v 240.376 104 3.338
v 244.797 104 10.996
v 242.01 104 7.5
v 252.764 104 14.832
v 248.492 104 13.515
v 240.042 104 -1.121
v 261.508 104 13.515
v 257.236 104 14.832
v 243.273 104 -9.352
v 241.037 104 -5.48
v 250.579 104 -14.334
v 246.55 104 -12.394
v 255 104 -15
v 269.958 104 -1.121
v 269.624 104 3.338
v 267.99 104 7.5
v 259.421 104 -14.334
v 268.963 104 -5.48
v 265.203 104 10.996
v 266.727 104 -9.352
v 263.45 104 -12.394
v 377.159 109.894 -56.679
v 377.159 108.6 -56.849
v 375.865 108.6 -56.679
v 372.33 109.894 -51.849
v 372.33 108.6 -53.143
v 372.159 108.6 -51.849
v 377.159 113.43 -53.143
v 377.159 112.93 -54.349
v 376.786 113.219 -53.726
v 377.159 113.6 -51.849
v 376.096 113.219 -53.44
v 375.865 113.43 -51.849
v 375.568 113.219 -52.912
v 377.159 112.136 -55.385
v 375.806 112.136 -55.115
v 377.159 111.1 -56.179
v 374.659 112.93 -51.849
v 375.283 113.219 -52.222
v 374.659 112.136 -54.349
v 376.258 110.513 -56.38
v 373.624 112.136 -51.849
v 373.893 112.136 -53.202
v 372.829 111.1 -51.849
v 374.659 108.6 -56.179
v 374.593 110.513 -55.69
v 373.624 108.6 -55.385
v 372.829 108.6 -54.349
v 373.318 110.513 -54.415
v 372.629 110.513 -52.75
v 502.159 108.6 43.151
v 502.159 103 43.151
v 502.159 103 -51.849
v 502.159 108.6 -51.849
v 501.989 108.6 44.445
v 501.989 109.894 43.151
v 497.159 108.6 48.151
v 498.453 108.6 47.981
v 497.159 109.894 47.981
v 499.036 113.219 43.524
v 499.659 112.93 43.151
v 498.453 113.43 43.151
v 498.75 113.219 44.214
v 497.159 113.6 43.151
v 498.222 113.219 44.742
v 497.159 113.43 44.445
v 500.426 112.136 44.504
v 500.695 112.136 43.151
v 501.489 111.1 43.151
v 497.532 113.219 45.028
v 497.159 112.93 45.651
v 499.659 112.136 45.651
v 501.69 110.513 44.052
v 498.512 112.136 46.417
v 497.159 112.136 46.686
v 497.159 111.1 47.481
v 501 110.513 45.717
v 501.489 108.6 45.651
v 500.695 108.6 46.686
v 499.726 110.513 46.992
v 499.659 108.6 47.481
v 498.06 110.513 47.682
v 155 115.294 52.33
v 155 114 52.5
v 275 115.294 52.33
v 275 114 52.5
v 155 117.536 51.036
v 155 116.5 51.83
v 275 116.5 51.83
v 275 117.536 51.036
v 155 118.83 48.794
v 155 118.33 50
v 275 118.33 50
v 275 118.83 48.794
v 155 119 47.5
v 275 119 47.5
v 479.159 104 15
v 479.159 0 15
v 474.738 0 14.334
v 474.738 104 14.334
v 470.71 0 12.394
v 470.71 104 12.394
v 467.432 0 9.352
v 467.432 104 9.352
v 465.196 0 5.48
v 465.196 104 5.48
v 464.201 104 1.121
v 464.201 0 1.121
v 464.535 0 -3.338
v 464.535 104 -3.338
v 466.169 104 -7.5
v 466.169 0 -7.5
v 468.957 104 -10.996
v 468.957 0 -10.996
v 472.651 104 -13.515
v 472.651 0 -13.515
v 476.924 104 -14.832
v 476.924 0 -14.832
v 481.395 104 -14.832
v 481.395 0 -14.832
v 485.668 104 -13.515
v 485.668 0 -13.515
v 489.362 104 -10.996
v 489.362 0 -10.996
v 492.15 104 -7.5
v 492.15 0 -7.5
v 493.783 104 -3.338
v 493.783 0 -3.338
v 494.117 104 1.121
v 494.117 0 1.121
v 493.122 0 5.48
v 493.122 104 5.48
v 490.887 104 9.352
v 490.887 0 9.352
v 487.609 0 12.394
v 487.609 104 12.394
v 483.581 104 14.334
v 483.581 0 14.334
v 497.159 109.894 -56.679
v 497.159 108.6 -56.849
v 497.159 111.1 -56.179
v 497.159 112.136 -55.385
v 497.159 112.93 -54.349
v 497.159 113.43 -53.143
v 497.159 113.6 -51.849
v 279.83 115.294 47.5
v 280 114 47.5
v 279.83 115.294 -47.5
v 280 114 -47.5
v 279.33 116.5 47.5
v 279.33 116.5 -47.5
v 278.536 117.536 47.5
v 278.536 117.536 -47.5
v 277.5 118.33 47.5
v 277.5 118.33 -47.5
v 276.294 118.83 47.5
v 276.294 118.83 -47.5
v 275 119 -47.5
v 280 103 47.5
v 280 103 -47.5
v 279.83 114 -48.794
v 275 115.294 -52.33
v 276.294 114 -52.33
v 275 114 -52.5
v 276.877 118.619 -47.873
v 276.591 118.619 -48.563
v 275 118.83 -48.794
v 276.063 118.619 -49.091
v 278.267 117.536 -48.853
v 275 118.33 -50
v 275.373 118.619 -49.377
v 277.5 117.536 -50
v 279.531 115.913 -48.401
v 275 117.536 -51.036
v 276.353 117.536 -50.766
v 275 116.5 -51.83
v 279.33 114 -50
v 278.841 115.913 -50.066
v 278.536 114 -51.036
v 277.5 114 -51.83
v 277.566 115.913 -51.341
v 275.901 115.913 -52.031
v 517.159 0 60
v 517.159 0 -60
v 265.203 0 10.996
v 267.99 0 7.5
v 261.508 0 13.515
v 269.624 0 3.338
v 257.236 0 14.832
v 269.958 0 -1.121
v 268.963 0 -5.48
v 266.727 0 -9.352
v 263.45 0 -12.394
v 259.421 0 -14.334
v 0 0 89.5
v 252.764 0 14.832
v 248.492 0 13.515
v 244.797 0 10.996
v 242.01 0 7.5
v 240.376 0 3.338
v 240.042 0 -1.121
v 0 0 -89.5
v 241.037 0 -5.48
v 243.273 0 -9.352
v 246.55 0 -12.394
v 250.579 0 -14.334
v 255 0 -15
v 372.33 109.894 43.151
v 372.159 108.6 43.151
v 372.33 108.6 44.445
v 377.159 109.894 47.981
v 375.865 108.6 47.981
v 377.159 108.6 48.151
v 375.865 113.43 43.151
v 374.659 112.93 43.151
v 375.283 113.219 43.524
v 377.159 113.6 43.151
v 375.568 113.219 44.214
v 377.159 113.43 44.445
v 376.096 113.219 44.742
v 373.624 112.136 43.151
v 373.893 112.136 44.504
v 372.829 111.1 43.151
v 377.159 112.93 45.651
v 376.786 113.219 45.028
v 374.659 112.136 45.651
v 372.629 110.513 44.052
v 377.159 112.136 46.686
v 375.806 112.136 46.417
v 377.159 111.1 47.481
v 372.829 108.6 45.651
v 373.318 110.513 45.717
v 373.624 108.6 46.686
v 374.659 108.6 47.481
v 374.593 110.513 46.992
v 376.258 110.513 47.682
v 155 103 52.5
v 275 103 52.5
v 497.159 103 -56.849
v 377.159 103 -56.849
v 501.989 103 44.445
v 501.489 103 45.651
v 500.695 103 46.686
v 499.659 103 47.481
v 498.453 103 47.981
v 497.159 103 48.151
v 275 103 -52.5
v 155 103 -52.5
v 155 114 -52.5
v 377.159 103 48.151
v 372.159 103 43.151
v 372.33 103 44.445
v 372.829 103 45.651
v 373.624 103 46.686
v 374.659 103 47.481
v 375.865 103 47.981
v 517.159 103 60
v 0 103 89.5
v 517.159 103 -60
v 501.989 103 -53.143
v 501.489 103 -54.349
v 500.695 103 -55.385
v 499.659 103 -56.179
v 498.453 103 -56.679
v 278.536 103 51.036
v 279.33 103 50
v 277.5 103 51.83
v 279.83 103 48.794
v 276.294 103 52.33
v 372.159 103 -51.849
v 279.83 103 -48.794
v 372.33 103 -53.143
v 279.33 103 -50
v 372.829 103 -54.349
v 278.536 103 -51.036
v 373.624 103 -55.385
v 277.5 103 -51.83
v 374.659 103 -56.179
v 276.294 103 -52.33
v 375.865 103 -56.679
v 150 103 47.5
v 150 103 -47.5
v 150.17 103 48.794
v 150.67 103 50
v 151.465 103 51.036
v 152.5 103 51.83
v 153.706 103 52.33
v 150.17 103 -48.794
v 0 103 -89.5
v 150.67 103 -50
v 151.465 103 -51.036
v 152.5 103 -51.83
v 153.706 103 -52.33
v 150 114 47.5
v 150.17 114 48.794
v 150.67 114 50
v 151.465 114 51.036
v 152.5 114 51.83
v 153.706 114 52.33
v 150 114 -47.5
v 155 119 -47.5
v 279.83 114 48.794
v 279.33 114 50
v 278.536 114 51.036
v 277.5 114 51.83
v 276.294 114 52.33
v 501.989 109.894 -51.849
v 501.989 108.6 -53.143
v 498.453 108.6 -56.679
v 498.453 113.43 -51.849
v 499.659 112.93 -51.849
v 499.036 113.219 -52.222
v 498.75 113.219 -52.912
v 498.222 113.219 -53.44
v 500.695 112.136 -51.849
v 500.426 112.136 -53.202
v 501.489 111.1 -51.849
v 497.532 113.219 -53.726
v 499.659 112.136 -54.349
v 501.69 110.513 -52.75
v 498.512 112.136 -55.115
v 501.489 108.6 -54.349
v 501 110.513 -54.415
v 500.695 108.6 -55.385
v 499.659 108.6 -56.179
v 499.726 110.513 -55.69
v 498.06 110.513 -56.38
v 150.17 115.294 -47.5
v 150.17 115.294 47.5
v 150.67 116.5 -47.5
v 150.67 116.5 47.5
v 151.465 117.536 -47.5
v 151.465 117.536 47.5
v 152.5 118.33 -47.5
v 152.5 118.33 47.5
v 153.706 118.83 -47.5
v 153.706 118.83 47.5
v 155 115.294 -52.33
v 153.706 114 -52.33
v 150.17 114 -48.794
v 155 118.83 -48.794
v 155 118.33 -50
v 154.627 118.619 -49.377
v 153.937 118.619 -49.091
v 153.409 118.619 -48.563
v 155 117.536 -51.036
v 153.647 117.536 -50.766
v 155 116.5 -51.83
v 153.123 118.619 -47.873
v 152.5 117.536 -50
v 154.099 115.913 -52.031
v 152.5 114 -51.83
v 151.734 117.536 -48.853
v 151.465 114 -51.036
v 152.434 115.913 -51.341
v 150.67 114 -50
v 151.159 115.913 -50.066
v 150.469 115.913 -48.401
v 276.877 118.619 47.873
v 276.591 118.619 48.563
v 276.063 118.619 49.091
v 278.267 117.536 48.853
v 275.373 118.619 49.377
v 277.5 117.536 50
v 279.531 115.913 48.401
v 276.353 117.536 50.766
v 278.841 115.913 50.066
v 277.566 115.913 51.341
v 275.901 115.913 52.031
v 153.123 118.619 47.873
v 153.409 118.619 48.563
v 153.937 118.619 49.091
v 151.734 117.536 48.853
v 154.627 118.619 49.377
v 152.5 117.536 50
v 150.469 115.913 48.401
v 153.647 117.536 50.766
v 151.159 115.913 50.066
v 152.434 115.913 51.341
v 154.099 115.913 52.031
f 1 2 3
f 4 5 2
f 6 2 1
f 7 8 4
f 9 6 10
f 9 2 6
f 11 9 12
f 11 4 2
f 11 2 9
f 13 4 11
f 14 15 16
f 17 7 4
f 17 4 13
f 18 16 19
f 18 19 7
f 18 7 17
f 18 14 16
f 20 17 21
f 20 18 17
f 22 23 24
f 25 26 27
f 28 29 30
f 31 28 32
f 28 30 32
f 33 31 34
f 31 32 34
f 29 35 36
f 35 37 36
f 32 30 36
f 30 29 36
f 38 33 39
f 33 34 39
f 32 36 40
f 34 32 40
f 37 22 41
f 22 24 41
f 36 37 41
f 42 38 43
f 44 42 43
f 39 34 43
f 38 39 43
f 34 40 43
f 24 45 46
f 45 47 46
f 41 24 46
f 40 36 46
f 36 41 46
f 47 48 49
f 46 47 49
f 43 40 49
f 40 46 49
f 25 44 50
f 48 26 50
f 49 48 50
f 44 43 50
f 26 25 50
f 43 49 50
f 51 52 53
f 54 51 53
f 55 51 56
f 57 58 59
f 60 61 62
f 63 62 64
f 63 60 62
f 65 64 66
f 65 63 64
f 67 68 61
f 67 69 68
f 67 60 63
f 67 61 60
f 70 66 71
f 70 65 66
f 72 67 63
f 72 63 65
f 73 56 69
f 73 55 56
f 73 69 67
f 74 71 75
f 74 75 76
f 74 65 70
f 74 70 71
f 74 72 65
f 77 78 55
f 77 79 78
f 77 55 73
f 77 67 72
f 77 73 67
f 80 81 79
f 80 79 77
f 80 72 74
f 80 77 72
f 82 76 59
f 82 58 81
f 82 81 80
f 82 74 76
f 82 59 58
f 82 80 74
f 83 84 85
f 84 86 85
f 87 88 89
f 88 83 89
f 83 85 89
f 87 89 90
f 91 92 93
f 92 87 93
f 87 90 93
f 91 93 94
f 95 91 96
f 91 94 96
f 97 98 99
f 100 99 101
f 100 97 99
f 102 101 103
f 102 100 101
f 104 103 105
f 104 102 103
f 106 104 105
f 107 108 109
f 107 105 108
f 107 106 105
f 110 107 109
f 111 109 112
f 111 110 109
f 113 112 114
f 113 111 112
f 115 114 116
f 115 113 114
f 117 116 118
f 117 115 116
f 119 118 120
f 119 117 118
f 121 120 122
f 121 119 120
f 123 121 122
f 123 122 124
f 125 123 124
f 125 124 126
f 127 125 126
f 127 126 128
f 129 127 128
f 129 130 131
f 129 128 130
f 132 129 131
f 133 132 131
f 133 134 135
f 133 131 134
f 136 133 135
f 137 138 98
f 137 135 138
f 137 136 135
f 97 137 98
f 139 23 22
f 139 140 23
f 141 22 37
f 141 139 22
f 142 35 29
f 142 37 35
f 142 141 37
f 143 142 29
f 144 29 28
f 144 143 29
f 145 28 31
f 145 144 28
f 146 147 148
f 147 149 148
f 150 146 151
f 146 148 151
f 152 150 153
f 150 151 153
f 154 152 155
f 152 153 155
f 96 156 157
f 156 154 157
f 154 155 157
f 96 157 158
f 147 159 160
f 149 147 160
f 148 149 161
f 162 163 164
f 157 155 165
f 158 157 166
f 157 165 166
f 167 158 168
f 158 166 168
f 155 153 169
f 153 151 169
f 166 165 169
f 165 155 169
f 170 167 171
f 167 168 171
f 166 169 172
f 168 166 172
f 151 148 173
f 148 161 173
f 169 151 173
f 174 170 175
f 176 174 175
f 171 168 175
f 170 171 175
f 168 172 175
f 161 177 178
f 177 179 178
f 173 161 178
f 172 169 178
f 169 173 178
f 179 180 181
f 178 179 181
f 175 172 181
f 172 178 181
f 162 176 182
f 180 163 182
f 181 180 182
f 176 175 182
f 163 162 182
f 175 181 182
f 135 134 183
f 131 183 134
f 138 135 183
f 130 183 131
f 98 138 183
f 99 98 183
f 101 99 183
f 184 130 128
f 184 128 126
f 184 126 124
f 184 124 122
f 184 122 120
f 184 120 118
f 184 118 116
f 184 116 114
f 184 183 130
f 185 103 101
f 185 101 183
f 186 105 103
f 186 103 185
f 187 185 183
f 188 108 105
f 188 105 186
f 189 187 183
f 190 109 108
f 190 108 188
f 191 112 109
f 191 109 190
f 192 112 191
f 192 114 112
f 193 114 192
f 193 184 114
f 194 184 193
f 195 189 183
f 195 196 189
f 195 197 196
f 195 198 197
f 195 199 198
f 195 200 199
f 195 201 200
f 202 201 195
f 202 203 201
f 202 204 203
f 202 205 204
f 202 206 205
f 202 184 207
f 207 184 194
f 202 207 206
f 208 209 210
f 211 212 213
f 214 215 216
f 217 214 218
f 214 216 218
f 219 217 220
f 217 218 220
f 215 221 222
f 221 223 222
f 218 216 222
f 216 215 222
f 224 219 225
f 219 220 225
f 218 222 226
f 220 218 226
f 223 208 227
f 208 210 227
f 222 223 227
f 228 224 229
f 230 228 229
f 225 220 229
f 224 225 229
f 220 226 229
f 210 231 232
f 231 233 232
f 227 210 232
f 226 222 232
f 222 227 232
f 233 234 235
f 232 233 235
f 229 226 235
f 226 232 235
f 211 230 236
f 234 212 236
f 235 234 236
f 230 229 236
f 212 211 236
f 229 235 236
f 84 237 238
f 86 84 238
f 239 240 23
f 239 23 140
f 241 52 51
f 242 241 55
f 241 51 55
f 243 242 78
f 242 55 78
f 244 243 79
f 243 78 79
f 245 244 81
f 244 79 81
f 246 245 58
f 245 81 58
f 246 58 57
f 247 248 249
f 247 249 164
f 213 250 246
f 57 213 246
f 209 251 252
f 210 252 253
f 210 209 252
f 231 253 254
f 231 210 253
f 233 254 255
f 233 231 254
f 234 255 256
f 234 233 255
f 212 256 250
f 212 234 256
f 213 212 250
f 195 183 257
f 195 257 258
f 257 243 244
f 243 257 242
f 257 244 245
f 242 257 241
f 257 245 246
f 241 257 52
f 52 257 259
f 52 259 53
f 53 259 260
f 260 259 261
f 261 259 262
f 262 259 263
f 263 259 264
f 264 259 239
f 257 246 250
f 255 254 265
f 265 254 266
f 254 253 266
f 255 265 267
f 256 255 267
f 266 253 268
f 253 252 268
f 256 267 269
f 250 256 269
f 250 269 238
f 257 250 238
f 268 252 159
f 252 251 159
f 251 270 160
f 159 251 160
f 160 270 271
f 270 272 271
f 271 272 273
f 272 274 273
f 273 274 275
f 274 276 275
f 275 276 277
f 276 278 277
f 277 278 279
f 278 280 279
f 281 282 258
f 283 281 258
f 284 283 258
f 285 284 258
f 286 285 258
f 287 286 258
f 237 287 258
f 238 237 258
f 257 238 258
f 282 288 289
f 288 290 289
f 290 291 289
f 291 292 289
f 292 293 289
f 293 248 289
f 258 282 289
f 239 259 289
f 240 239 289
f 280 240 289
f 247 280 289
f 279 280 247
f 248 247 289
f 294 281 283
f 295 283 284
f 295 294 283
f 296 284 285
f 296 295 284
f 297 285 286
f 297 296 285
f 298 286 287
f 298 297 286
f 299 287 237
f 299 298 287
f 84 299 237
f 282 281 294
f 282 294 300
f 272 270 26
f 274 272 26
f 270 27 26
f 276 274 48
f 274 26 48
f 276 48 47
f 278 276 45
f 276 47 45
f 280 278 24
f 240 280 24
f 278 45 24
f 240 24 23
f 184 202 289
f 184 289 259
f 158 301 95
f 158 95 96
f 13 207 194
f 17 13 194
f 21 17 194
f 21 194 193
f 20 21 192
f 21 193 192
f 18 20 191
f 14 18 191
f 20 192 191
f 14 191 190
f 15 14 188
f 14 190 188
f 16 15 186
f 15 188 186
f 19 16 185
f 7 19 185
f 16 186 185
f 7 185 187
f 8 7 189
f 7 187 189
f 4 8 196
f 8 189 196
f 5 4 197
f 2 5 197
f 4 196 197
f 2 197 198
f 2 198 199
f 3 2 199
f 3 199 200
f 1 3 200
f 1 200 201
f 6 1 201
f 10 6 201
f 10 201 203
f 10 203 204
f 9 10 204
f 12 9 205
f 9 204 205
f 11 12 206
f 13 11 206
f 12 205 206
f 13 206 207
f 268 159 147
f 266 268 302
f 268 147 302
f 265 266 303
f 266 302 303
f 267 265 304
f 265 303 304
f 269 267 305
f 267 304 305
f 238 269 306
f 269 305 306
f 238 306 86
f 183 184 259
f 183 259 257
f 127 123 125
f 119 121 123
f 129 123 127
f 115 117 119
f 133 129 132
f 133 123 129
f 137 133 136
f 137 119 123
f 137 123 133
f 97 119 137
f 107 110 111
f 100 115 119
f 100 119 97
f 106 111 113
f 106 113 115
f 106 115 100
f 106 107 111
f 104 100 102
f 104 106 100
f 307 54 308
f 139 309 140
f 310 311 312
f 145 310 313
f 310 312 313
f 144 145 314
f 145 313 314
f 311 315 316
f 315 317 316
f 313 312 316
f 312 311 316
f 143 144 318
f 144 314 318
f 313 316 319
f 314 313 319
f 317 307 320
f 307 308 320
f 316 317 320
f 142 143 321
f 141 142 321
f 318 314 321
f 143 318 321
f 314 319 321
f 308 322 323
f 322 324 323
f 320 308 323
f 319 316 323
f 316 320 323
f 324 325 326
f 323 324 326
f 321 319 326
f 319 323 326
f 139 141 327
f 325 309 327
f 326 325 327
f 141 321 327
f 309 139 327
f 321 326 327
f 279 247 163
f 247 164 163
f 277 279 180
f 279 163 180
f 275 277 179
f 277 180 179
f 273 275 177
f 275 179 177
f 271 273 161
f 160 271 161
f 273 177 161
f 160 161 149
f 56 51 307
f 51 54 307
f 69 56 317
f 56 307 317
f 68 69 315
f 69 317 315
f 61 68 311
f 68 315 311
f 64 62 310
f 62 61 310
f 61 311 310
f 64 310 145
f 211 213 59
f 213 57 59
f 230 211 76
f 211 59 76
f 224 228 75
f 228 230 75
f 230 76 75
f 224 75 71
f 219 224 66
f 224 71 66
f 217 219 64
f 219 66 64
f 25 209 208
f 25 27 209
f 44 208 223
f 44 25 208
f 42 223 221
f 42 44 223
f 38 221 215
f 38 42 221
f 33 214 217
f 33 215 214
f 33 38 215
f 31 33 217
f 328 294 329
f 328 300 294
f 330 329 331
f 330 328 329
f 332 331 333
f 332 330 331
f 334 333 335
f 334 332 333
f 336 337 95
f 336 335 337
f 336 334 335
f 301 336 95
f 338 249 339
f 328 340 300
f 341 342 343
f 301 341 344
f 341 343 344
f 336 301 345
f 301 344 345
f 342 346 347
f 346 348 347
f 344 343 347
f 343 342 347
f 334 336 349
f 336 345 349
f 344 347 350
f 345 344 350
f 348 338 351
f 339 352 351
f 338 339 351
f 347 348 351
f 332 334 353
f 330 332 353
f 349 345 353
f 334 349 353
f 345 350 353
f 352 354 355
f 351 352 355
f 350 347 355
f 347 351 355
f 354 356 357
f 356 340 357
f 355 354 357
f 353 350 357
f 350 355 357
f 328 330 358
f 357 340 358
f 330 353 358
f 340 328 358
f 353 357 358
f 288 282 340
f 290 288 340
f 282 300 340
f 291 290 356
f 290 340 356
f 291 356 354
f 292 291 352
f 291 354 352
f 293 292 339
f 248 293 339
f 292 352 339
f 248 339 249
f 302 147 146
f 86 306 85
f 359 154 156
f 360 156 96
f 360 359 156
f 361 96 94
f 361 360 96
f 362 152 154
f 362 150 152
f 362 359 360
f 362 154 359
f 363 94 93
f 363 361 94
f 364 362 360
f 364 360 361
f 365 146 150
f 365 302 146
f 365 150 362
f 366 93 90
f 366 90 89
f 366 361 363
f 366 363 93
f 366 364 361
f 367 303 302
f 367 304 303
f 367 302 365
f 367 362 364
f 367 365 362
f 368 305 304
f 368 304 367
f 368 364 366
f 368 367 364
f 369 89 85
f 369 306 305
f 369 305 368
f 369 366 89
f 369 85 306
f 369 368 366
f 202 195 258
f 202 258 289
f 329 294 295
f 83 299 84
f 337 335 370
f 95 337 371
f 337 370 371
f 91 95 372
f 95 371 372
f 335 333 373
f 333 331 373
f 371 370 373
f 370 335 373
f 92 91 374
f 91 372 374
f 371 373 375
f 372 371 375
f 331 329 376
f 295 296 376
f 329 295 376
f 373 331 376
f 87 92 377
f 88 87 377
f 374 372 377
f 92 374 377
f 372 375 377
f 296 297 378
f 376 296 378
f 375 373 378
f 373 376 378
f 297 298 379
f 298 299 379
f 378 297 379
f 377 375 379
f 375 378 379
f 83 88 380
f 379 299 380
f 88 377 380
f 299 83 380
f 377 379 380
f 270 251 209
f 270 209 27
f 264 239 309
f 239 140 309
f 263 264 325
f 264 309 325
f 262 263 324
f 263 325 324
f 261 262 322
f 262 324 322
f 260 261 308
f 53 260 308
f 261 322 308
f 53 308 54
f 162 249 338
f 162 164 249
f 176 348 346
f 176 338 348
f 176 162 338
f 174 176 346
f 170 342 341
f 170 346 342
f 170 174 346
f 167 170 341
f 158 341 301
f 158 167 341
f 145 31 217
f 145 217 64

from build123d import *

# Parameters (mm, degrees)
BOSS_EXTRUDE1_DEPTH     = 103
FILLET1_R               = 0.0001
SKETCH2_W               = 130
SKETCH2_H               = 105
BOSS_EXTRUDE2_DEPTH     = 10.6
FILLET2_R               = 5
SKETCH3_W               = 130
SKETCH3_H               = 105
BOSS_EXTRUDE3_DEPTH     = 16
FILLET3_R               = 5
CUT_EXTRUDE1_DEPTH      = 539.168188348
CUT_EXTRUDE1_DEPTH_BACK = 104
SKETCH4_R               = 15
SKETCH5_R               = 15
CUT_EXTRUDE2_DEPTH      = 104


with BuildPart() as part:
    # Sketch1 → Boss-Extrude1 (new body)
    with BuildSketch(Plane(origin=(0, 0, 0), x_dir=(1, 0, 0), z_dir=(0, 1, 0))):
        Polygon((0, -89.5), (0, 89.5), (517.159308144, 60), (517.159308144, -60), align=None)
    extrude(amount=BOSS_EXTRUDE1_DEPTH)

    # Fillet1
    fillet1_edges = [part.edges().sort_by_distance(p)[0] for p in [
        (0, 0, 0),
        (0, 51.5, -89.5),
        (258.579654072, 0, -74.75),
        (517.159308144, 51.5, -60),
        (517.159308144, 0, 0),
        (517.159308144, 51.5, 60),
        (258.579654072, 0, 74.75),
        (0, 51.5, 89.5),
        (0, 103, 0),
        (517.159308144, 103, 0),
        (258.579654072, 103, -74.75),
        (258.579654072, 103, 74.75),
    ]]
    fillet(fillet1_edges, radius=FILLET1_R)

    # Sketch2 → Boss-Extrude2 (add)
    with BuildSketch(Plane(origin=(0, 103, 0), x_dir=(1, 0, 0), z_dir=(0, 1, 0))):
        with Locations((437.159208144, 4.349038924)):
            Rectangle(SKETCH2_W, SKETCH2_H)
    extrude(amount=BOSS_EXTRUDE2_DEPTH)

    # Fillet2
    fillet2_edges = [part.edges().sort_by_distance(p)[0] for p in [
        (502.159208144, 108.3, 48.150961076),
        (502.159208144, 108.3, -56.849038924),
        (372.159208144, 108.3, -56.849038924),
        (372.159208144, 108.3, 48.150961076),
        (502.159208144, 113.6, -4.349038924),
        (437.159208144, 113.6, -56.849038924),
        (372.159208144, 113.6, -4.349038924),
        (437.159208144, 113.6, 48.150961076),
    ]]
    fillet(fillet2_edges, radius=FILLET2_R)

    # Sketch3 → Boss-Extrude3 (add)
    with BuildSketch(Plane(origin=(0, 103, 0), x_dir=(1, 0, 0), z_dir=(0, 1, 0))):
        with Locations((215.0001, 0)):
            Rectangle(SKETCH3_W, SKETCH3_H)
    extrude(amount=BOSS_EXTRUDE3_DEPTH)

    # Fillet3
    fillet3_edges = [part.edges().sort_by_distance(p)[0] for p in [
        (280.0001, 111, 52.5),
        (280.0001, 111, -52.5),
        (150.0001, 111, -52.5),
        (150.0001, 111, 52.5),
        (280.0001, 119, 0),
        (215.0001, 119, -52.5),
        (150.0001, 119, 0),
        (215.0001, 119, 52.5),
    ]]
    fillet(fillet3_edges, radius=FILLET3_R)

    # Sketch4 → Cut-Extrude1 (cut, two sides: drawn at the far end of the back side and taken through both)
    with BuildSketch(Plane.XZ.offset(-CUT_EXTRUDE1_DEPTH_BACK)):
        with Locations(Location((479.159308144, 0, 0), (0, 0, 90))):
            Circle(SKETCH4_R)
    extrude(amount=CUT_EXTRUDE1_DEPTH + CUT_EXTRUDE1_DEPTH_BACK, mode=Mode.SUBTRACT)

    # Sketch5 → Cut-Extrude2 (cut)
    with BuildSketch(Plane.XZ):
        with Locations(Location((255, 0, 0), (0, 0, 270))):
            Circle(SKETCH5_R)
    extrude(amount=-CUT_EXTRUDE2_DEPTH, mode=Mode.SUBTRACT)


solid = part.part
